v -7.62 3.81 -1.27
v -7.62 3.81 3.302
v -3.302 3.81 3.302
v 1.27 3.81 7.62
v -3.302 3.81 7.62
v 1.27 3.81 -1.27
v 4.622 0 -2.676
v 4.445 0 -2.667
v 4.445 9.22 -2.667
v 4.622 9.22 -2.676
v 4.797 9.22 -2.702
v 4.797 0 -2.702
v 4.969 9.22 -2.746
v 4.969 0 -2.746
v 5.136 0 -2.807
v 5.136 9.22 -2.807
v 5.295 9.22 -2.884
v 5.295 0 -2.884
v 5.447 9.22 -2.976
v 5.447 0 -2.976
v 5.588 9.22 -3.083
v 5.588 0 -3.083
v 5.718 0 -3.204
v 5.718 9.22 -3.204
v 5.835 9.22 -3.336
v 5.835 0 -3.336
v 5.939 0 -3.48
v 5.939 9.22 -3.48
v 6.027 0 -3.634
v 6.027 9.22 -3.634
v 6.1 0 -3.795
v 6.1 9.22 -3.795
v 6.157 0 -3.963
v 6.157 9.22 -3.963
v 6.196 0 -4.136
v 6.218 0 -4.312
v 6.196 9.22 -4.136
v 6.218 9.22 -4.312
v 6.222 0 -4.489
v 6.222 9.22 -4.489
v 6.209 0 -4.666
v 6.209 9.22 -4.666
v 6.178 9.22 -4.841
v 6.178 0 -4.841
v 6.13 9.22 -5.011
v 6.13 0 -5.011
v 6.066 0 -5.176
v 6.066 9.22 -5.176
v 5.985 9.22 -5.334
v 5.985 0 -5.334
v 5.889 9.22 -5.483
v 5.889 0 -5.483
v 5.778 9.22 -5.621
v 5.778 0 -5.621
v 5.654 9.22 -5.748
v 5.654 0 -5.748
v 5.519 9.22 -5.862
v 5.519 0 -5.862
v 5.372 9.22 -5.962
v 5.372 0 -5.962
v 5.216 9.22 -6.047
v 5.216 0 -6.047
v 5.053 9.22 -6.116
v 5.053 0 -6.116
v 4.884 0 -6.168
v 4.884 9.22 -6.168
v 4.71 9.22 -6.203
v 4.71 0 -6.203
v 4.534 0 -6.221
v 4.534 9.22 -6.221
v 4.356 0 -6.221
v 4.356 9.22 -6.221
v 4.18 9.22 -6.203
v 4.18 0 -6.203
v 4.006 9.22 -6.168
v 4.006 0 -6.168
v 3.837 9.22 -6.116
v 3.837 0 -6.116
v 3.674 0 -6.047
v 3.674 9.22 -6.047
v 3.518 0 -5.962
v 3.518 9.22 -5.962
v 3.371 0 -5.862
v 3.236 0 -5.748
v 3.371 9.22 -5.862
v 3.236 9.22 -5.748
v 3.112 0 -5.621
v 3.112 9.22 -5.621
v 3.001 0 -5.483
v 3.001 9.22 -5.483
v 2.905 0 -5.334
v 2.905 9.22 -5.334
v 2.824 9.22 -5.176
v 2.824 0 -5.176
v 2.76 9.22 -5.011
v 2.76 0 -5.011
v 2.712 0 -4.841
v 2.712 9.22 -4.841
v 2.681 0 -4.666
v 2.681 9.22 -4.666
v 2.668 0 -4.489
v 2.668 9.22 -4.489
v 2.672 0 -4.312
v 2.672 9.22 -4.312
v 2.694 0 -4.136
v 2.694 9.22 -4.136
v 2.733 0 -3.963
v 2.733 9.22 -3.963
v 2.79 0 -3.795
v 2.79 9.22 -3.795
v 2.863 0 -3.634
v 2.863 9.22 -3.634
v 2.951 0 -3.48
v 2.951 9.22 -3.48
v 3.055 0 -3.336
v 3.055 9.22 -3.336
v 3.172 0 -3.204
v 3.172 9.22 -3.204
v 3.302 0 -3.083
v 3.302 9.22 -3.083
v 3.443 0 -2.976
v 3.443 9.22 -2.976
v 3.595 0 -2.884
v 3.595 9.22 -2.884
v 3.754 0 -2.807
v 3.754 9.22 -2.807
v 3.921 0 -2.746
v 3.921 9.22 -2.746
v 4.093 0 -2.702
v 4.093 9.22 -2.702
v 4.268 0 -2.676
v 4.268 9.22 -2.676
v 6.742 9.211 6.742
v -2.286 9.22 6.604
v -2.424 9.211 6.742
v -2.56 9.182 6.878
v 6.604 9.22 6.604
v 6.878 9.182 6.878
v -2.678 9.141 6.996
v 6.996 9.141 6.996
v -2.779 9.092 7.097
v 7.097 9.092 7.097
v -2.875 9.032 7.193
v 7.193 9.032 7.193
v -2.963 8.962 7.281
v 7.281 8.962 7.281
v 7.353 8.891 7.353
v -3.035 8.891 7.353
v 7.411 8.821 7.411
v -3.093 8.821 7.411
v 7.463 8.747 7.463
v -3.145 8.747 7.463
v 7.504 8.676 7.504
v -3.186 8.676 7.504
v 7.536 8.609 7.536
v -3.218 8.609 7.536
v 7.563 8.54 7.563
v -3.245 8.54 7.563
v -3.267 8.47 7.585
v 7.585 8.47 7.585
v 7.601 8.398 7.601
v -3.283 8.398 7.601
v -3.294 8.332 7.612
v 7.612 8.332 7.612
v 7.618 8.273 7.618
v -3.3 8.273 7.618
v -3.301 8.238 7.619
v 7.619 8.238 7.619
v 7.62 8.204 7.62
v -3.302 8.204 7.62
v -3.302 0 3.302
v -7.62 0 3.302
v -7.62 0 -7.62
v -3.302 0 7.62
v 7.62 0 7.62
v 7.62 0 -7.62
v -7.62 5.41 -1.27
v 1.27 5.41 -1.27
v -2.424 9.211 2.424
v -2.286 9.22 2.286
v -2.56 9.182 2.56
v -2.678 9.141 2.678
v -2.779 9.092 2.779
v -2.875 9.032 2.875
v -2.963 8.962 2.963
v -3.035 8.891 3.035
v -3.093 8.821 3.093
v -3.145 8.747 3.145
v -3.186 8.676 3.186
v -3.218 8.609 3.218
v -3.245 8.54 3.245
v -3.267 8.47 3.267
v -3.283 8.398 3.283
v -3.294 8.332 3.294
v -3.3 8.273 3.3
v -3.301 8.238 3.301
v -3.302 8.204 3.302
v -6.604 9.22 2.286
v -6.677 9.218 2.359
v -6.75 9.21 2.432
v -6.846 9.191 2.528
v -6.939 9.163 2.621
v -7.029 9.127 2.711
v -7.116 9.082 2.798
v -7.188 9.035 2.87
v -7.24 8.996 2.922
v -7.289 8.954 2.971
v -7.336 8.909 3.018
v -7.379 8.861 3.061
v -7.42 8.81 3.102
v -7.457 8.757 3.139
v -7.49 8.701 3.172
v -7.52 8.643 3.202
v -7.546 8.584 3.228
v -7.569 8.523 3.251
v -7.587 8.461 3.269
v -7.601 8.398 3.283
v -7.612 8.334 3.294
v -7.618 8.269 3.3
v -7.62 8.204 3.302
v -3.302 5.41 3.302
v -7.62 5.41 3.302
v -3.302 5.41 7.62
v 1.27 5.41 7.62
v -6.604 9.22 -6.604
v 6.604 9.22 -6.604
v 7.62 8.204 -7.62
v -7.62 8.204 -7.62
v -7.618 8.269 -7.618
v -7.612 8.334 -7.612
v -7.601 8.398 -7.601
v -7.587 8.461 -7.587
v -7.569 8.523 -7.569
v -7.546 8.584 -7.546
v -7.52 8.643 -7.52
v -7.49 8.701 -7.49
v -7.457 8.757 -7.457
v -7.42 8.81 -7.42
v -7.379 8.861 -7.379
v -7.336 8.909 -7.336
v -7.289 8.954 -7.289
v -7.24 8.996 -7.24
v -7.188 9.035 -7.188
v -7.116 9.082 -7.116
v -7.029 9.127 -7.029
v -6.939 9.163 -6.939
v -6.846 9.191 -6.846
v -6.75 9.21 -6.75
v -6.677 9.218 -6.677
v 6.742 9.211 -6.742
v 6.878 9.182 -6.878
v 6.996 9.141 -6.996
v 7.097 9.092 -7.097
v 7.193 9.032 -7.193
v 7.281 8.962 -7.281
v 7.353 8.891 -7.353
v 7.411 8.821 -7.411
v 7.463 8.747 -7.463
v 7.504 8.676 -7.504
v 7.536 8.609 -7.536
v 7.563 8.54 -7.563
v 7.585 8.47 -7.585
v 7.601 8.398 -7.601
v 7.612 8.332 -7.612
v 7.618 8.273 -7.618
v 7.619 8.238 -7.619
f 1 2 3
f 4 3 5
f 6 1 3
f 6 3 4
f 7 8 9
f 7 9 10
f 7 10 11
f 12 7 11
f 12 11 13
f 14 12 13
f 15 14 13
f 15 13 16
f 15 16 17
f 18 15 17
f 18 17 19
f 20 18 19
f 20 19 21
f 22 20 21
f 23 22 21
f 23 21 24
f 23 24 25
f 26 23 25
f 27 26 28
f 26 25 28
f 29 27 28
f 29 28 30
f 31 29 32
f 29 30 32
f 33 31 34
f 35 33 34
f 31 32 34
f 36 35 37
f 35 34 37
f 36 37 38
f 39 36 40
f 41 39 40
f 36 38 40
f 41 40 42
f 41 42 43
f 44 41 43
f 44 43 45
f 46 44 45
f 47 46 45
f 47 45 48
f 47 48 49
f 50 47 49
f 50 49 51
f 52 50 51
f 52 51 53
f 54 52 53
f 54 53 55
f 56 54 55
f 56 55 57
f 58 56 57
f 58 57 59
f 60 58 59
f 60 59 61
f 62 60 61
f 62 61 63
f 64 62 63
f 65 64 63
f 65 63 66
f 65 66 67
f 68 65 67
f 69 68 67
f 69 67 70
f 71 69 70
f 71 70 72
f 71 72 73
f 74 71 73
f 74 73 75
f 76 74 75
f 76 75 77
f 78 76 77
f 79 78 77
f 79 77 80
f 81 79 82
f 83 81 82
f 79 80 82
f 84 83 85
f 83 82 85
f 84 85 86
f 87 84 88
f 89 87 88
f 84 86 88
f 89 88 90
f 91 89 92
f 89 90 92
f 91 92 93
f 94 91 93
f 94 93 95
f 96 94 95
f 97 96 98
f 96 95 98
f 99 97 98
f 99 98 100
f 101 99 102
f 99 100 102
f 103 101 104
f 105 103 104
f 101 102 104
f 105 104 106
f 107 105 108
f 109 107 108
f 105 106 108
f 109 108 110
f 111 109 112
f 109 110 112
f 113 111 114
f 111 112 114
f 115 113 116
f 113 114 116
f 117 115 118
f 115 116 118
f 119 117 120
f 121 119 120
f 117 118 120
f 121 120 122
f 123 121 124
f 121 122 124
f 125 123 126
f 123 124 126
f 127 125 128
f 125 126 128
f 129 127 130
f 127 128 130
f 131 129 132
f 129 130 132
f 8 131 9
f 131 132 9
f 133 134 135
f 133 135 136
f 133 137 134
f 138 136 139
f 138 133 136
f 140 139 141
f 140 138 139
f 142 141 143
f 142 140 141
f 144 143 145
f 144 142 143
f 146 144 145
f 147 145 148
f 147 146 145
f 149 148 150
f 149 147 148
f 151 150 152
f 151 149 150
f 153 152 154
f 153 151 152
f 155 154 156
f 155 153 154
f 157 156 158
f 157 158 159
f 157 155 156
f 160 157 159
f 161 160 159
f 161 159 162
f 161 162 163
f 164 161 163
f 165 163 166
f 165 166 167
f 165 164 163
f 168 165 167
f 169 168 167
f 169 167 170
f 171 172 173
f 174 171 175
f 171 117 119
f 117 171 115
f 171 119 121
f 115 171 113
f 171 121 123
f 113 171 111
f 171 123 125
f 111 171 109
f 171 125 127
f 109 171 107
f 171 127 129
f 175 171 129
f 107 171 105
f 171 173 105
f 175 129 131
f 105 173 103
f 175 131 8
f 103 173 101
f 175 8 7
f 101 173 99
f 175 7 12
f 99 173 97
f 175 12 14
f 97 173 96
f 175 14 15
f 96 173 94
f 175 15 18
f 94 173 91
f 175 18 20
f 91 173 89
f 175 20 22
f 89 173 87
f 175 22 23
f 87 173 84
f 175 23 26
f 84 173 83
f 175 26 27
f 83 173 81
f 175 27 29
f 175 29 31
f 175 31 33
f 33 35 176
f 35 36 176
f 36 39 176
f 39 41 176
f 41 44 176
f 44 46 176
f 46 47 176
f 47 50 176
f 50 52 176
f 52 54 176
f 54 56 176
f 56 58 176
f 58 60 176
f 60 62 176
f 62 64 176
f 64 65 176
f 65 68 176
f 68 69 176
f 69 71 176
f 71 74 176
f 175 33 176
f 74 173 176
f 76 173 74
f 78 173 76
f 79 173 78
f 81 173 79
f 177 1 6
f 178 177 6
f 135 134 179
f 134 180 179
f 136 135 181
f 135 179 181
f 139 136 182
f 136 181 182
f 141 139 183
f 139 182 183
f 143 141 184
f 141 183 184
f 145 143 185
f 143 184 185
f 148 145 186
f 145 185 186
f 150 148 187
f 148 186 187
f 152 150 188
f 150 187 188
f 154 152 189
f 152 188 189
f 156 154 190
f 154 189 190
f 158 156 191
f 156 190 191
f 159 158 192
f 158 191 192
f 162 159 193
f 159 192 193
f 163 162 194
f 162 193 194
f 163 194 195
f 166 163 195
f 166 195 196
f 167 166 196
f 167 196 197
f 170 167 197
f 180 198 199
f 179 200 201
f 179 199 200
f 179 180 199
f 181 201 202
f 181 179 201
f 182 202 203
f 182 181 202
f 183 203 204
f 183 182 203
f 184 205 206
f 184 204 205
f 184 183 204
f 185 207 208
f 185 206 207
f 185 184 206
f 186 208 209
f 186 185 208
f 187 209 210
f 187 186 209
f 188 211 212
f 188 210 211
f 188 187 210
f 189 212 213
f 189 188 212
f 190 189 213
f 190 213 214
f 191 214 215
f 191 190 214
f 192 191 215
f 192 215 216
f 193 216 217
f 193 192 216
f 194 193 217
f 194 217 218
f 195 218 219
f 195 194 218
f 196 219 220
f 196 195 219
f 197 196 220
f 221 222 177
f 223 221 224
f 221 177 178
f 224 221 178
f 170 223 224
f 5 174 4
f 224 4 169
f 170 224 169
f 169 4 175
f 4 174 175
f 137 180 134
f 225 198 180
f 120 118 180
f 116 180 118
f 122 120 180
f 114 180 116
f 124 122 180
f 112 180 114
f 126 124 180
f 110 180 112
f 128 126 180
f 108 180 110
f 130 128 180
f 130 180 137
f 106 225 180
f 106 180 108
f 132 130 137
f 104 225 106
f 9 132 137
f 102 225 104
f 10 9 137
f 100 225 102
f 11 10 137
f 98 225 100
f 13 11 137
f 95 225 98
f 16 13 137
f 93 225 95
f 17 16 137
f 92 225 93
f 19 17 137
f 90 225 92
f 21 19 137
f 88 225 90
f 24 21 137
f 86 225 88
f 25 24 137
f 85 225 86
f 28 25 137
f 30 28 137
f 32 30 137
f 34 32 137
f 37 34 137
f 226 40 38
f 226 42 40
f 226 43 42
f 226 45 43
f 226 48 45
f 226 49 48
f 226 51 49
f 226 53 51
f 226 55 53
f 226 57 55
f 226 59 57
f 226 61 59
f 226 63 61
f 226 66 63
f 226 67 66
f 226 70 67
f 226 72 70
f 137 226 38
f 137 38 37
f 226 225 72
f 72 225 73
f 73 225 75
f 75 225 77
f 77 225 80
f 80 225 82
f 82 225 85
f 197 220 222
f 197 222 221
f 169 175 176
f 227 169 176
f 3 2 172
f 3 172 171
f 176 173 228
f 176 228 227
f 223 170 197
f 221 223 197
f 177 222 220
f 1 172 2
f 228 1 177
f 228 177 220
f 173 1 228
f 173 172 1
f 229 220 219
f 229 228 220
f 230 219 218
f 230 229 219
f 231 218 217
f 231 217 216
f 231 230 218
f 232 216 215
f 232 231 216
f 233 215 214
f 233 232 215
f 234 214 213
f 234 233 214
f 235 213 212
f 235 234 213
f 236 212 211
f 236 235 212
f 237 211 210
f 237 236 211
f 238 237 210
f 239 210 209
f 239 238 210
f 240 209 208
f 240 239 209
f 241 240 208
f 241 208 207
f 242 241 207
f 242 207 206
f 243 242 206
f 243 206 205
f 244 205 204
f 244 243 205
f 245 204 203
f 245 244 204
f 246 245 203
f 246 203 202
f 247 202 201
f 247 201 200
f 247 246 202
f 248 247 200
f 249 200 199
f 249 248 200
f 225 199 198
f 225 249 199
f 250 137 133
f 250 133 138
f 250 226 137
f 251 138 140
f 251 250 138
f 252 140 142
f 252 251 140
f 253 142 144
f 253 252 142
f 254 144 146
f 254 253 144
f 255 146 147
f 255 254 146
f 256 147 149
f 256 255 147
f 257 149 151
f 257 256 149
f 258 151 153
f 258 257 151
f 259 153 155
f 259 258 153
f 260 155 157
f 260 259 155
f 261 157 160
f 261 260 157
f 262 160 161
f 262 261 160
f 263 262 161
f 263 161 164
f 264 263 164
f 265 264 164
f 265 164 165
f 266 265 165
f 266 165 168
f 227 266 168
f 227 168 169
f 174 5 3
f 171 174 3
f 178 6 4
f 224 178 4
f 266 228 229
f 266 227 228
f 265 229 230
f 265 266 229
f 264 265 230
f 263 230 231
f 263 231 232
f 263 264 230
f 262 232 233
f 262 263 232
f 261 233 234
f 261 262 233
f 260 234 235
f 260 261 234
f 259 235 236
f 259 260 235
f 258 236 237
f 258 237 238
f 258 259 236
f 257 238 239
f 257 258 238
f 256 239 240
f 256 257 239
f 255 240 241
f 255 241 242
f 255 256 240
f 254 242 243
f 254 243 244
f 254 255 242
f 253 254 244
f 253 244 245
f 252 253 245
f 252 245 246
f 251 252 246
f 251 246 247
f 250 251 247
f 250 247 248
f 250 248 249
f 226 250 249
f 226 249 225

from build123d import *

# Parameters (mm, degrees)
SKETCH1_W           = 15.24
SKETCH1_H           = 15.24
BOSS_EXTRUDE1_DEPTH = 3.81
BOSS_EXTRUDE2_DEPTH = 1.6002
SKETCH3_W           = 15.24
SKETCH3_H           = 15.24
BOSS_EXTRUDE3_DEPTH = 3.81
SKETCH4_W           = 4.318
SKETCH4_H           = 4.318
CUT_EXTRUDE1_DEPTH  = 15.182414746
SKETCH5_R           = 1.778
CUT_EXTRUDE2_DEPTH  = 15.182414746
FILLET1_R           = 1.016


with BuildPart() as part:
    # Sketch1 → Boss-Extrude1 (new body)
    with BuildSketch(Plane(origin=(0, 0, 0), x_dir=(1, 0, 0), z_dir=(0, 1, 0))):
        Rectangle(SKETCH1_W, SKETCH1_H)
    extrude(amount=BOSS_EXTRUDE1_DEPTH)

    # Sketch2 → Boss-Extrude2 (add)
    with BuildSketch(Plane(origin=(0, 3.81, 0), x_dir=(1, 0, 0), z_dir=(0, 1, 0))):
        Polygon((-7.62, 7.62), (-7.62, 1.27), (1.27, 1.27), (1.27, -7.62), (7.62, -7.62), (7.62, 7.62), align=None)
    extrude(amount=BOSS_EXTRUDE2_DEPTH)

    # Sketch3 → Boss-Extrude3 (add)
    with BuildSketch(Plane(origin=(0, 5.4102, 0), x_dir=(1, 0, 0), z_dir=(0, 1, 0))):
        Rectangle(SKETCH3_W, SKETCH3_H)
    extrude(amount=BOSS_EXTRUDE3_DEPTH)

    # Sketch4 → Cut-Extrude1 (cut, through all)
    with BuildSketch(Plane(origin=(0, 9.2202, 0), x_dir=(1, 0, 0), z_dir=(0, 1, 0))):
        with Locations((-5.461, -5.461)):
            Rectangle(SKETCH4_W, SKETCH4_H)
    extrude(amount=-CUT_EXTRUDE1_DEPTH, mode=Mode.SUBTRACT)

    # Sketch5 → Cut-Extrude2 (cut, through all)
    with BuildSketch(Plane(origin=(0, 9.2202, 0), x_dir=(1, 0, 0), z_dir=(0, 1, 0))):
        with Locations(Location((4.445, 4.445, 0), (0, 0, 270))):
            Circle(SKETCH5_R)
    extrude(amount=-CUT_EXTRUDE2_DEPTH, mode=Mode.SUBTRACT)

    # Fillet1
    fillet1_edges = [part.edges().sort_by_distance(p)[0] for p in [
        (7.62, 9.2202, 0),
        (0, 9.2202, -7.62),
        (-7.62, 9.2202, -2.159),
        (2.159, 9.2202, 7.62),
        (-3.302, 9.2202, 5.461),
        (-5.461, 9.2202, 3.302),
    ]]
    fillet(fillet1_edges, radius=FILLET1_R)


solid = part.part
